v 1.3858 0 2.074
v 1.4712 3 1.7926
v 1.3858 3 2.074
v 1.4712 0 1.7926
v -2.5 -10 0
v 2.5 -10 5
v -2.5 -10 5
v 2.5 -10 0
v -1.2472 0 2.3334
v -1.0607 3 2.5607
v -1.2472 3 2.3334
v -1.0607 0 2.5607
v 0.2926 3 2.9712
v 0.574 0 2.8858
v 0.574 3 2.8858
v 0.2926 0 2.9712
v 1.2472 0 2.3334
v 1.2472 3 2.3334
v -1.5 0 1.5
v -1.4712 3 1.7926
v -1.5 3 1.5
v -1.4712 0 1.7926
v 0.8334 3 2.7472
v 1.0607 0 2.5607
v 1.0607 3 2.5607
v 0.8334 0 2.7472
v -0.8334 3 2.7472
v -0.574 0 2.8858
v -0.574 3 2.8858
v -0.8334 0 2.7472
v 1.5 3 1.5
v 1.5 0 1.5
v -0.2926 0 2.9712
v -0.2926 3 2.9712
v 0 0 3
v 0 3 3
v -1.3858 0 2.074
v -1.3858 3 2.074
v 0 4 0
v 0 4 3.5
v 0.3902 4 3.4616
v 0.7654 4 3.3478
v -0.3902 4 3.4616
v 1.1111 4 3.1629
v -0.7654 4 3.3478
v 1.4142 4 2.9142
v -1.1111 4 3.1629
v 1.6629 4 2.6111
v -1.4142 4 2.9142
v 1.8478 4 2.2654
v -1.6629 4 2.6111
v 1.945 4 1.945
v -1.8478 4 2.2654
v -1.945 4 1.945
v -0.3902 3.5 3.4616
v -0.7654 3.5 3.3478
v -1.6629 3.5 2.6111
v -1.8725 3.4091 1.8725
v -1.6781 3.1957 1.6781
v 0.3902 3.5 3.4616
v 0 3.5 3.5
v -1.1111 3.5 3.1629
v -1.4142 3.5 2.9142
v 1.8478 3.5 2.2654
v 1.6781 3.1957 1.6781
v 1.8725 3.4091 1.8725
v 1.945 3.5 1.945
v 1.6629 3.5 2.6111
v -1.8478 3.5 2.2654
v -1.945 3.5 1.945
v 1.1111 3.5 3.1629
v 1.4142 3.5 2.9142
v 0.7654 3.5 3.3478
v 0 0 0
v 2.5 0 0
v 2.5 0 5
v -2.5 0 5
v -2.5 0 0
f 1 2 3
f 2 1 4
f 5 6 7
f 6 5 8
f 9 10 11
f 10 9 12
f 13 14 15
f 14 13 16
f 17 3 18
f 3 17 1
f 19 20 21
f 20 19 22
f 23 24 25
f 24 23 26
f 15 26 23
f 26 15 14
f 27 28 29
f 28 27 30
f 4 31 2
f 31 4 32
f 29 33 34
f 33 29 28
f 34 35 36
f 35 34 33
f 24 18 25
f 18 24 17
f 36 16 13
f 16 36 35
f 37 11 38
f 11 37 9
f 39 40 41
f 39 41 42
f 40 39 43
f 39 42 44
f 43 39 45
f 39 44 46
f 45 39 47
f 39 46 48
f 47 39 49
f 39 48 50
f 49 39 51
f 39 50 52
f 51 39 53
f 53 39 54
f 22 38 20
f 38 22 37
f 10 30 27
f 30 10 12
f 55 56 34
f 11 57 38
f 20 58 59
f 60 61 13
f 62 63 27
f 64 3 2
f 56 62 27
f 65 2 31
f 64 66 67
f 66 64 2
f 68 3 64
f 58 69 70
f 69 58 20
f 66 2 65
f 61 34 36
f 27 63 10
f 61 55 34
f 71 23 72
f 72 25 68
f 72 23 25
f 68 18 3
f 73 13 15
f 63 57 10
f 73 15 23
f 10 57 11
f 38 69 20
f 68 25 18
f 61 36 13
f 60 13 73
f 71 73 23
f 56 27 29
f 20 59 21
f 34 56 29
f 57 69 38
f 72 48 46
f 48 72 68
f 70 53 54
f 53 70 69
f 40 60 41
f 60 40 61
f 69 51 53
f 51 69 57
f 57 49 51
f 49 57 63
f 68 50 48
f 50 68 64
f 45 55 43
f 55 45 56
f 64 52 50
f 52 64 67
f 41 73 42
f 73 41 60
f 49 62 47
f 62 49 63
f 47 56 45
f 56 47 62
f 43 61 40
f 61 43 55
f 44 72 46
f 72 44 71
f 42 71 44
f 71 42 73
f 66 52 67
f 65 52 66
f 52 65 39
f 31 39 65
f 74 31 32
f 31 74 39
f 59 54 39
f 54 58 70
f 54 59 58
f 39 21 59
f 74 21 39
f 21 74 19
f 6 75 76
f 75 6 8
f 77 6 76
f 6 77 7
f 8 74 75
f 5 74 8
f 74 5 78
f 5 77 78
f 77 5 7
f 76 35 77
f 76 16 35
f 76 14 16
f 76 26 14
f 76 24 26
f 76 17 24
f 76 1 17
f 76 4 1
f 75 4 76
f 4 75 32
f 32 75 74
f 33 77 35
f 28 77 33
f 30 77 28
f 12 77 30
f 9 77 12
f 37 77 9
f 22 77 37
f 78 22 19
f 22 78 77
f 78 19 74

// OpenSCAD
// Peg Mask

render_part=1; // peg_mask()

module peg_mask(peg_d=3.0,rim_d=4.0,peg_min_l=3.0,body_h=5.0,body_w=5.0,body_l=10.0) {
  $fn=32;
  union() {
   rotate([-90,0,0]) intersection() {
    rotate([0,0,-135]) translate([0,0,-body_l]) cube(size=[rim_d,rim_d,body_l+peg_min_l+rim_d-peg_d],center=false);
    rotate([0,0,45]) union() {
      translate([-peg_d/2/sqrt(2),-peg_d/2/sqrt(2),-body_l]) cylinder(r=peg_d/2,h=body_l+peg_min_l+rim_d-peg_d,center=false);
      translate([-peg_d/2/sqrt(2),-peg_d/2/sqrt(2),peg_min_l]) cylinder(r1=peg_d/2,r2=rim_d/2,h=(rim_d/2-peg_d/2),center=false);
      translate([-peg_d/2/sqrt(2),-peg_d/2/sqrt(2),peg_min_l+(rim_d/2-peg_d/2)]) cylinder(r=rim_d/2,h=(rim_d/2-peg_d/2),center=false);
    }
   }
   translate([-body_w/2,-body_l,0,]) cube(size=[body_w,body_l,body_h],center=false);
  }
}

if(render_part==1) {
  echo("Rendering peg_mask()...");
  peg_mask();
}
